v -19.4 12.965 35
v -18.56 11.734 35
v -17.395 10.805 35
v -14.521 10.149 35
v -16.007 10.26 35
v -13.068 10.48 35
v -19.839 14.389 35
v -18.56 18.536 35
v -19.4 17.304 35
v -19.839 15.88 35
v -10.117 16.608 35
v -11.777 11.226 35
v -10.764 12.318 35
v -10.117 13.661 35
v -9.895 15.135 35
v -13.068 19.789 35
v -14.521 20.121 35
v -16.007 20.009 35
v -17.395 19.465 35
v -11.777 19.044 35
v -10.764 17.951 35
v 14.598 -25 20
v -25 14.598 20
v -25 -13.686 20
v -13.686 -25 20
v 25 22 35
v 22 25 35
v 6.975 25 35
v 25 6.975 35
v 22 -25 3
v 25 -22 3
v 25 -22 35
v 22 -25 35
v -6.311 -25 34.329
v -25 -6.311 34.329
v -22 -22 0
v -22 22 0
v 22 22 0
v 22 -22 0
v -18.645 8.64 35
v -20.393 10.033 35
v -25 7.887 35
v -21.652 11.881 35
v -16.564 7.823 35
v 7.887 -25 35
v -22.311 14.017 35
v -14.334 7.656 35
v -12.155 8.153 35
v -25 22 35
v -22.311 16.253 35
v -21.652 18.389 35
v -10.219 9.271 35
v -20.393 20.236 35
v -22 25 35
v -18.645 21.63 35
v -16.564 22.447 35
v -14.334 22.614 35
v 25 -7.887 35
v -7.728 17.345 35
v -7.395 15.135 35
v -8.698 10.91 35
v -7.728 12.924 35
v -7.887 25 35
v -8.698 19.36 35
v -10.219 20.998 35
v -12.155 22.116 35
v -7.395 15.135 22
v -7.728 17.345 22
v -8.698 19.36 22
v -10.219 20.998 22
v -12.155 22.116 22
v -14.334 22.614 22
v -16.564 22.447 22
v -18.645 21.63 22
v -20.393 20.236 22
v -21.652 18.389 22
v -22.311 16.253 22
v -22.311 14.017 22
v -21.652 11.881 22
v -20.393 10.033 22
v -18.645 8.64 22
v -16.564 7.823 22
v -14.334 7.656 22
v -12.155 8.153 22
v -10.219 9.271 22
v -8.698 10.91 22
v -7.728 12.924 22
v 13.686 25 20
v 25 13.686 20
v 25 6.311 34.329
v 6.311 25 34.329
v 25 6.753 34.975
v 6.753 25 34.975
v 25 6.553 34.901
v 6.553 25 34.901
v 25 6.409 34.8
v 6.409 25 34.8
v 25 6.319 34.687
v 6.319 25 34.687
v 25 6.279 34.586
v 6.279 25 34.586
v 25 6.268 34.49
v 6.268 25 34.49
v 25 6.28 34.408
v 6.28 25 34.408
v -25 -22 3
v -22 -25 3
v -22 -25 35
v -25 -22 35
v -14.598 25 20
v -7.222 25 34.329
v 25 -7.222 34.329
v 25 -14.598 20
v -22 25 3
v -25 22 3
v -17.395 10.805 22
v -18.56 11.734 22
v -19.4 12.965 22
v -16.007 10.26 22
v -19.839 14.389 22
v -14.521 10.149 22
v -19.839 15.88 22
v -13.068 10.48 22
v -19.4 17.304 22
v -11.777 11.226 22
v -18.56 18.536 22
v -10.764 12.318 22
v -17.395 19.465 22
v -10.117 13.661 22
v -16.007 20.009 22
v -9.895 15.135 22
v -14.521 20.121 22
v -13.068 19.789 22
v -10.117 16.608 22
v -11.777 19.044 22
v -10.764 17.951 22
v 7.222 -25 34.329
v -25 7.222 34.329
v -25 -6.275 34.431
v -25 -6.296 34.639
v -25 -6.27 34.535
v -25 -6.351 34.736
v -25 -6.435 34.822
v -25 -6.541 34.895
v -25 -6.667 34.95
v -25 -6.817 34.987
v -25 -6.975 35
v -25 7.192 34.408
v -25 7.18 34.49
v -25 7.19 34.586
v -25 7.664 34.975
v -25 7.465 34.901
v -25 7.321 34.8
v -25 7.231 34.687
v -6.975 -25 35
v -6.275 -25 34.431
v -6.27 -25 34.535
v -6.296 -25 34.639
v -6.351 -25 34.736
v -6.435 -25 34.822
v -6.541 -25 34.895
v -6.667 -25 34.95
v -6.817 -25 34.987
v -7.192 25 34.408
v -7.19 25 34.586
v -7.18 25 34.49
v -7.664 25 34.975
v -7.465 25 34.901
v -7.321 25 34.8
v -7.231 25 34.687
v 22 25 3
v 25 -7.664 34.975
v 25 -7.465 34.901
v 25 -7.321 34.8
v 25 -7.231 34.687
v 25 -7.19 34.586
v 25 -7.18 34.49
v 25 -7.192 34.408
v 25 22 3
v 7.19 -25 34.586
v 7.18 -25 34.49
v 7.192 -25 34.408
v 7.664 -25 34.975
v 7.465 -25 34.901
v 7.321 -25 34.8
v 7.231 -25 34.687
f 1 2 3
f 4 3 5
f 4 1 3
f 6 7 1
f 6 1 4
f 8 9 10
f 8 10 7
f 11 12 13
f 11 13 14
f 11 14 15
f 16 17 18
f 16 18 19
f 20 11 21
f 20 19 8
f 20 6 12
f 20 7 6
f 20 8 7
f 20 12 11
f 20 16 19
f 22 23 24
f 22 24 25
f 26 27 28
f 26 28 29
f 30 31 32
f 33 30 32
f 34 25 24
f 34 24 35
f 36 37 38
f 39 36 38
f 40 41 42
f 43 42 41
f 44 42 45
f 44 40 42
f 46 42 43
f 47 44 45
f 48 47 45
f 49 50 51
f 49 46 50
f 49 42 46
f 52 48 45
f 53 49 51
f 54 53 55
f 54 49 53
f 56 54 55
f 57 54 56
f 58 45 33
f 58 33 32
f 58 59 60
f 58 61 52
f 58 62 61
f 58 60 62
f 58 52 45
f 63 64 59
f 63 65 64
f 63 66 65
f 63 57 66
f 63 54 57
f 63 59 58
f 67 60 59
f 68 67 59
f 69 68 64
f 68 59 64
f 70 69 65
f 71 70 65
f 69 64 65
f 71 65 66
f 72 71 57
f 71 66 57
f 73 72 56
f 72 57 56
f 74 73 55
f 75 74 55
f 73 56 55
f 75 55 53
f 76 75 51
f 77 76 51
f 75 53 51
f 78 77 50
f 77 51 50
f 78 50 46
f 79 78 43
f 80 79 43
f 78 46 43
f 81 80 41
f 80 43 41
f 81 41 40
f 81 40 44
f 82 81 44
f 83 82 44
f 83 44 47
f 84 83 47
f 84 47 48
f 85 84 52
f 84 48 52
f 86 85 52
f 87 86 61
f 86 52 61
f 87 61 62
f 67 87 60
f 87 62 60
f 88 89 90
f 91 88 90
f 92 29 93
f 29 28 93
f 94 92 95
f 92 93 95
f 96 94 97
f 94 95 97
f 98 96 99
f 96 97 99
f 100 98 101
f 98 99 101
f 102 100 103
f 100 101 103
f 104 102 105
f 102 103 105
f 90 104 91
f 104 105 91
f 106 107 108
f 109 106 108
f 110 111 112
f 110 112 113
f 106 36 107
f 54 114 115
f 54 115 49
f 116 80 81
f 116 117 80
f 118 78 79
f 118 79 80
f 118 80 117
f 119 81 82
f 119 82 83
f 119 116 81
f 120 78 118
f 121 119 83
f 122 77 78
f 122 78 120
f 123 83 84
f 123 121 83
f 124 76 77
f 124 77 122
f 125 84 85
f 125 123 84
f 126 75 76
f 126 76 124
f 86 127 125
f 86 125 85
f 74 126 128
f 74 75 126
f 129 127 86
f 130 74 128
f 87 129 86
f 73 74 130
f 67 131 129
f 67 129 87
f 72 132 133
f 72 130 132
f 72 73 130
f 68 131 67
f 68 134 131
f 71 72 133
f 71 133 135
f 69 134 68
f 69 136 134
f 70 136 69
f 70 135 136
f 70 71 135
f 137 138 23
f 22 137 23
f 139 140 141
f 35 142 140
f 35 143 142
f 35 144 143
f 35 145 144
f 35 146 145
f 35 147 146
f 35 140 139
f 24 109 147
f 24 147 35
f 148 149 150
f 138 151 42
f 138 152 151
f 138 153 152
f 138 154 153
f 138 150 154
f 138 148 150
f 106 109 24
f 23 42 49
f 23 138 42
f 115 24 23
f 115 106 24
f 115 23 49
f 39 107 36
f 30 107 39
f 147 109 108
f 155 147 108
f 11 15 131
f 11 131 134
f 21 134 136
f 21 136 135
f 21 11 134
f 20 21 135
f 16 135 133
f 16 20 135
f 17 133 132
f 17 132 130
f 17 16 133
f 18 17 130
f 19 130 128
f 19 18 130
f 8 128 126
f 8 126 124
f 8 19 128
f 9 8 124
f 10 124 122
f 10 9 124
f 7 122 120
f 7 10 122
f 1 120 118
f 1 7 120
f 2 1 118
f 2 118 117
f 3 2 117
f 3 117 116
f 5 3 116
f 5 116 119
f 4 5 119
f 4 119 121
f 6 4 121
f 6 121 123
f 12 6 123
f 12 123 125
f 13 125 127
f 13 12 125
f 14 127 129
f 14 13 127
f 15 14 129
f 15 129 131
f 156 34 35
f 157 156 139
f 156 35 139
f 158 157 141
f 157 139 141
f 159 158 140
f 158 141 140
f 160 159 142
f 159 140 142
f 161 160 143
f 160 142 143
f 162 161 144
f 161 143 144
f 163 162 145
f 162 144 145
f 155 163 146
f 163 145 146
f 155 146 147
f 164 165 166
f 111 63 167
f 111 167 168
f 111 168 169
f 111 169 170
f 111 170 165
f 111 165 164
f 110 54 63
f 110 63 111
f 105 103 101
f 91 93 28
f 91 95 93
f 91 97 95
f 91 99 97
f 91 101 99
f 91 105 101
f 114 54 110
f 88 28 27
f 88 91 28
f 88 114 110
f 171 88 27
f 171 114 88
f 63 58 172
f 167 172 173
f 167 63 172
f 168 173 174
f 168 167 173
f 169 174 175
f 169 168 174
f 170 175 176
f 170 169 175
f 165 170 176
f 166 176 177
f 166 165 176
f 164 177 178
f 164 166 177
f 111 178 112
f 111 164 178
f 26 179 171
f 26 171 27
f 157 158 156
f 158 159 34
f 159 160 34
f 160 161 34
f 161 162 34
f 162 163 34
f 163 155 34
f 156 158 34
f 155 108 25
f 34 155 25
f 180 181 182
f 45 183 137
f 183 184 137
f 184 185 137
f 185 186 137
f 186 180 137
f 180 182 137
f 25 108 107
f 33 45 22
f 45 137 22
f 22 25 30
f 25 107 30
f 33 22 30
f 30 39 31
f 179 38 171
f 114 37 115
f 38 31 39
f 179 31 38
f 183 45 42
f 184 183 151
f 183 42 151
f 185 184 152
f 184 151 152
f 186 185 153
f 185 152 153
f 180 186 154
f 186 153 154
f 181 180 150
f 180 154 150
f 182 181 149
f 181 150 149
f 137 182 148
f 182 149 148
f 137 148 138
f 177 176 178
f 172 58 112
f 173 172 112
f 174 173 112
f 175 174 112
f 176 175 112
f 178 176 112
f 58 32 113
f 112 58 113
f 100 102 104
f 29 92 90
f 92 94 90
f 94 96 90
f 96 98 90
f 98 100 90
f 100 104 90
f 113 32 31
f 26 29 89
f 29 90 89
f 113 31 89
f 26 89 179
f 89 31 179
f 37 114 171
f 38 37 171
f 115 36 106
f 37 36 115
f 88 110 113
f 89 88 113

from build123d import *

# Parameters (mm, degrees)
F0_W     = 50
F0_H     = 50
F1_DEPTH = 35
F4_DEPTH = 74.8112648726
F6_SIZE  = 3
F7_R     = 0.5
F8_R     = 7.5
F8_R_2   = 5
F9_DEPTH = 13


# Not quite as in the source:
# - a pattern or mirror of a feature is missing from the dataset's text; its kind, count and spacing are read off the source's solid


with BuildPart() as f1:
    # F0 (on Top) → F1 (new body)
    with BuildSketch(Plane.XY):
        Rectangle(F0_W, F0_H)
    extrude(amount=F1_DEPTH)

    # F3 (on face) → F4 (cut)
    with BuildSketch(Plane(origin=(25, -25, 0), x_dir=(-0.7071067812, -0.7071067812, 0), z_dir=(-0.7071067812, 0.7071067812, 0))):
        Polygon((27.3553390593, 20), (21.8957855453, 35), (12.8148925733, 35), (7.3553390593, 20), align=None)
    f4 = extrude(amount=F4_DEPTH, mode=Mode.SUBTRACT)

    # F4_copies: F4 across plane
    add(f4.mirror(Plane(origin=(0, 0, 0), x_dir=(0.7071067812, -0.7071067812, 0), z_dir=(0.7071067812, 0.7071067812, 0))), mode=Mode.SUBTRACT)

    # F6
    f6_edges = [f1.edges().sort_by_distance(p)[0] for p in [
        (25, 0, 0),
        (0, -25, 0),
        (-25, 0, 0),
        (0, 25, 0),
        (25, -25, 17.5),
        (-25, -25, 17.5),
        (-25, 25, 17.5),
        (25, 25, 17.5),
    ]]
    chamfer(f6_edges, length=F6_SIZE)

    # F7
    f7_edges = [f1.edges().sort_by_distance(p)[0] for p in [
        (-15.482658, -15.482658, 35),
        (-9.061497, -9.061497, 35),
        (9.061497, 9.061497, 35),
        (15.482658, 15.482658, 35),
    ]]
    fillet(f7_edges, radius=F7_R)

    # F8 (on face) → F9 (cut)
    with BuildSketch(Plane.XY.offset(35)):
        with Locations((-14.8947280353, 15.1347092162)):
            Circle(F8_R)
        with Locations((-14.8947280353, 15.1347092162)):
            Circle(F8_R_2, mode=Mode.SUBTRACT)
    extrude(amount=-F9_DEPTH, mode=Mode.SUBTRACT)


solid = f1.part
